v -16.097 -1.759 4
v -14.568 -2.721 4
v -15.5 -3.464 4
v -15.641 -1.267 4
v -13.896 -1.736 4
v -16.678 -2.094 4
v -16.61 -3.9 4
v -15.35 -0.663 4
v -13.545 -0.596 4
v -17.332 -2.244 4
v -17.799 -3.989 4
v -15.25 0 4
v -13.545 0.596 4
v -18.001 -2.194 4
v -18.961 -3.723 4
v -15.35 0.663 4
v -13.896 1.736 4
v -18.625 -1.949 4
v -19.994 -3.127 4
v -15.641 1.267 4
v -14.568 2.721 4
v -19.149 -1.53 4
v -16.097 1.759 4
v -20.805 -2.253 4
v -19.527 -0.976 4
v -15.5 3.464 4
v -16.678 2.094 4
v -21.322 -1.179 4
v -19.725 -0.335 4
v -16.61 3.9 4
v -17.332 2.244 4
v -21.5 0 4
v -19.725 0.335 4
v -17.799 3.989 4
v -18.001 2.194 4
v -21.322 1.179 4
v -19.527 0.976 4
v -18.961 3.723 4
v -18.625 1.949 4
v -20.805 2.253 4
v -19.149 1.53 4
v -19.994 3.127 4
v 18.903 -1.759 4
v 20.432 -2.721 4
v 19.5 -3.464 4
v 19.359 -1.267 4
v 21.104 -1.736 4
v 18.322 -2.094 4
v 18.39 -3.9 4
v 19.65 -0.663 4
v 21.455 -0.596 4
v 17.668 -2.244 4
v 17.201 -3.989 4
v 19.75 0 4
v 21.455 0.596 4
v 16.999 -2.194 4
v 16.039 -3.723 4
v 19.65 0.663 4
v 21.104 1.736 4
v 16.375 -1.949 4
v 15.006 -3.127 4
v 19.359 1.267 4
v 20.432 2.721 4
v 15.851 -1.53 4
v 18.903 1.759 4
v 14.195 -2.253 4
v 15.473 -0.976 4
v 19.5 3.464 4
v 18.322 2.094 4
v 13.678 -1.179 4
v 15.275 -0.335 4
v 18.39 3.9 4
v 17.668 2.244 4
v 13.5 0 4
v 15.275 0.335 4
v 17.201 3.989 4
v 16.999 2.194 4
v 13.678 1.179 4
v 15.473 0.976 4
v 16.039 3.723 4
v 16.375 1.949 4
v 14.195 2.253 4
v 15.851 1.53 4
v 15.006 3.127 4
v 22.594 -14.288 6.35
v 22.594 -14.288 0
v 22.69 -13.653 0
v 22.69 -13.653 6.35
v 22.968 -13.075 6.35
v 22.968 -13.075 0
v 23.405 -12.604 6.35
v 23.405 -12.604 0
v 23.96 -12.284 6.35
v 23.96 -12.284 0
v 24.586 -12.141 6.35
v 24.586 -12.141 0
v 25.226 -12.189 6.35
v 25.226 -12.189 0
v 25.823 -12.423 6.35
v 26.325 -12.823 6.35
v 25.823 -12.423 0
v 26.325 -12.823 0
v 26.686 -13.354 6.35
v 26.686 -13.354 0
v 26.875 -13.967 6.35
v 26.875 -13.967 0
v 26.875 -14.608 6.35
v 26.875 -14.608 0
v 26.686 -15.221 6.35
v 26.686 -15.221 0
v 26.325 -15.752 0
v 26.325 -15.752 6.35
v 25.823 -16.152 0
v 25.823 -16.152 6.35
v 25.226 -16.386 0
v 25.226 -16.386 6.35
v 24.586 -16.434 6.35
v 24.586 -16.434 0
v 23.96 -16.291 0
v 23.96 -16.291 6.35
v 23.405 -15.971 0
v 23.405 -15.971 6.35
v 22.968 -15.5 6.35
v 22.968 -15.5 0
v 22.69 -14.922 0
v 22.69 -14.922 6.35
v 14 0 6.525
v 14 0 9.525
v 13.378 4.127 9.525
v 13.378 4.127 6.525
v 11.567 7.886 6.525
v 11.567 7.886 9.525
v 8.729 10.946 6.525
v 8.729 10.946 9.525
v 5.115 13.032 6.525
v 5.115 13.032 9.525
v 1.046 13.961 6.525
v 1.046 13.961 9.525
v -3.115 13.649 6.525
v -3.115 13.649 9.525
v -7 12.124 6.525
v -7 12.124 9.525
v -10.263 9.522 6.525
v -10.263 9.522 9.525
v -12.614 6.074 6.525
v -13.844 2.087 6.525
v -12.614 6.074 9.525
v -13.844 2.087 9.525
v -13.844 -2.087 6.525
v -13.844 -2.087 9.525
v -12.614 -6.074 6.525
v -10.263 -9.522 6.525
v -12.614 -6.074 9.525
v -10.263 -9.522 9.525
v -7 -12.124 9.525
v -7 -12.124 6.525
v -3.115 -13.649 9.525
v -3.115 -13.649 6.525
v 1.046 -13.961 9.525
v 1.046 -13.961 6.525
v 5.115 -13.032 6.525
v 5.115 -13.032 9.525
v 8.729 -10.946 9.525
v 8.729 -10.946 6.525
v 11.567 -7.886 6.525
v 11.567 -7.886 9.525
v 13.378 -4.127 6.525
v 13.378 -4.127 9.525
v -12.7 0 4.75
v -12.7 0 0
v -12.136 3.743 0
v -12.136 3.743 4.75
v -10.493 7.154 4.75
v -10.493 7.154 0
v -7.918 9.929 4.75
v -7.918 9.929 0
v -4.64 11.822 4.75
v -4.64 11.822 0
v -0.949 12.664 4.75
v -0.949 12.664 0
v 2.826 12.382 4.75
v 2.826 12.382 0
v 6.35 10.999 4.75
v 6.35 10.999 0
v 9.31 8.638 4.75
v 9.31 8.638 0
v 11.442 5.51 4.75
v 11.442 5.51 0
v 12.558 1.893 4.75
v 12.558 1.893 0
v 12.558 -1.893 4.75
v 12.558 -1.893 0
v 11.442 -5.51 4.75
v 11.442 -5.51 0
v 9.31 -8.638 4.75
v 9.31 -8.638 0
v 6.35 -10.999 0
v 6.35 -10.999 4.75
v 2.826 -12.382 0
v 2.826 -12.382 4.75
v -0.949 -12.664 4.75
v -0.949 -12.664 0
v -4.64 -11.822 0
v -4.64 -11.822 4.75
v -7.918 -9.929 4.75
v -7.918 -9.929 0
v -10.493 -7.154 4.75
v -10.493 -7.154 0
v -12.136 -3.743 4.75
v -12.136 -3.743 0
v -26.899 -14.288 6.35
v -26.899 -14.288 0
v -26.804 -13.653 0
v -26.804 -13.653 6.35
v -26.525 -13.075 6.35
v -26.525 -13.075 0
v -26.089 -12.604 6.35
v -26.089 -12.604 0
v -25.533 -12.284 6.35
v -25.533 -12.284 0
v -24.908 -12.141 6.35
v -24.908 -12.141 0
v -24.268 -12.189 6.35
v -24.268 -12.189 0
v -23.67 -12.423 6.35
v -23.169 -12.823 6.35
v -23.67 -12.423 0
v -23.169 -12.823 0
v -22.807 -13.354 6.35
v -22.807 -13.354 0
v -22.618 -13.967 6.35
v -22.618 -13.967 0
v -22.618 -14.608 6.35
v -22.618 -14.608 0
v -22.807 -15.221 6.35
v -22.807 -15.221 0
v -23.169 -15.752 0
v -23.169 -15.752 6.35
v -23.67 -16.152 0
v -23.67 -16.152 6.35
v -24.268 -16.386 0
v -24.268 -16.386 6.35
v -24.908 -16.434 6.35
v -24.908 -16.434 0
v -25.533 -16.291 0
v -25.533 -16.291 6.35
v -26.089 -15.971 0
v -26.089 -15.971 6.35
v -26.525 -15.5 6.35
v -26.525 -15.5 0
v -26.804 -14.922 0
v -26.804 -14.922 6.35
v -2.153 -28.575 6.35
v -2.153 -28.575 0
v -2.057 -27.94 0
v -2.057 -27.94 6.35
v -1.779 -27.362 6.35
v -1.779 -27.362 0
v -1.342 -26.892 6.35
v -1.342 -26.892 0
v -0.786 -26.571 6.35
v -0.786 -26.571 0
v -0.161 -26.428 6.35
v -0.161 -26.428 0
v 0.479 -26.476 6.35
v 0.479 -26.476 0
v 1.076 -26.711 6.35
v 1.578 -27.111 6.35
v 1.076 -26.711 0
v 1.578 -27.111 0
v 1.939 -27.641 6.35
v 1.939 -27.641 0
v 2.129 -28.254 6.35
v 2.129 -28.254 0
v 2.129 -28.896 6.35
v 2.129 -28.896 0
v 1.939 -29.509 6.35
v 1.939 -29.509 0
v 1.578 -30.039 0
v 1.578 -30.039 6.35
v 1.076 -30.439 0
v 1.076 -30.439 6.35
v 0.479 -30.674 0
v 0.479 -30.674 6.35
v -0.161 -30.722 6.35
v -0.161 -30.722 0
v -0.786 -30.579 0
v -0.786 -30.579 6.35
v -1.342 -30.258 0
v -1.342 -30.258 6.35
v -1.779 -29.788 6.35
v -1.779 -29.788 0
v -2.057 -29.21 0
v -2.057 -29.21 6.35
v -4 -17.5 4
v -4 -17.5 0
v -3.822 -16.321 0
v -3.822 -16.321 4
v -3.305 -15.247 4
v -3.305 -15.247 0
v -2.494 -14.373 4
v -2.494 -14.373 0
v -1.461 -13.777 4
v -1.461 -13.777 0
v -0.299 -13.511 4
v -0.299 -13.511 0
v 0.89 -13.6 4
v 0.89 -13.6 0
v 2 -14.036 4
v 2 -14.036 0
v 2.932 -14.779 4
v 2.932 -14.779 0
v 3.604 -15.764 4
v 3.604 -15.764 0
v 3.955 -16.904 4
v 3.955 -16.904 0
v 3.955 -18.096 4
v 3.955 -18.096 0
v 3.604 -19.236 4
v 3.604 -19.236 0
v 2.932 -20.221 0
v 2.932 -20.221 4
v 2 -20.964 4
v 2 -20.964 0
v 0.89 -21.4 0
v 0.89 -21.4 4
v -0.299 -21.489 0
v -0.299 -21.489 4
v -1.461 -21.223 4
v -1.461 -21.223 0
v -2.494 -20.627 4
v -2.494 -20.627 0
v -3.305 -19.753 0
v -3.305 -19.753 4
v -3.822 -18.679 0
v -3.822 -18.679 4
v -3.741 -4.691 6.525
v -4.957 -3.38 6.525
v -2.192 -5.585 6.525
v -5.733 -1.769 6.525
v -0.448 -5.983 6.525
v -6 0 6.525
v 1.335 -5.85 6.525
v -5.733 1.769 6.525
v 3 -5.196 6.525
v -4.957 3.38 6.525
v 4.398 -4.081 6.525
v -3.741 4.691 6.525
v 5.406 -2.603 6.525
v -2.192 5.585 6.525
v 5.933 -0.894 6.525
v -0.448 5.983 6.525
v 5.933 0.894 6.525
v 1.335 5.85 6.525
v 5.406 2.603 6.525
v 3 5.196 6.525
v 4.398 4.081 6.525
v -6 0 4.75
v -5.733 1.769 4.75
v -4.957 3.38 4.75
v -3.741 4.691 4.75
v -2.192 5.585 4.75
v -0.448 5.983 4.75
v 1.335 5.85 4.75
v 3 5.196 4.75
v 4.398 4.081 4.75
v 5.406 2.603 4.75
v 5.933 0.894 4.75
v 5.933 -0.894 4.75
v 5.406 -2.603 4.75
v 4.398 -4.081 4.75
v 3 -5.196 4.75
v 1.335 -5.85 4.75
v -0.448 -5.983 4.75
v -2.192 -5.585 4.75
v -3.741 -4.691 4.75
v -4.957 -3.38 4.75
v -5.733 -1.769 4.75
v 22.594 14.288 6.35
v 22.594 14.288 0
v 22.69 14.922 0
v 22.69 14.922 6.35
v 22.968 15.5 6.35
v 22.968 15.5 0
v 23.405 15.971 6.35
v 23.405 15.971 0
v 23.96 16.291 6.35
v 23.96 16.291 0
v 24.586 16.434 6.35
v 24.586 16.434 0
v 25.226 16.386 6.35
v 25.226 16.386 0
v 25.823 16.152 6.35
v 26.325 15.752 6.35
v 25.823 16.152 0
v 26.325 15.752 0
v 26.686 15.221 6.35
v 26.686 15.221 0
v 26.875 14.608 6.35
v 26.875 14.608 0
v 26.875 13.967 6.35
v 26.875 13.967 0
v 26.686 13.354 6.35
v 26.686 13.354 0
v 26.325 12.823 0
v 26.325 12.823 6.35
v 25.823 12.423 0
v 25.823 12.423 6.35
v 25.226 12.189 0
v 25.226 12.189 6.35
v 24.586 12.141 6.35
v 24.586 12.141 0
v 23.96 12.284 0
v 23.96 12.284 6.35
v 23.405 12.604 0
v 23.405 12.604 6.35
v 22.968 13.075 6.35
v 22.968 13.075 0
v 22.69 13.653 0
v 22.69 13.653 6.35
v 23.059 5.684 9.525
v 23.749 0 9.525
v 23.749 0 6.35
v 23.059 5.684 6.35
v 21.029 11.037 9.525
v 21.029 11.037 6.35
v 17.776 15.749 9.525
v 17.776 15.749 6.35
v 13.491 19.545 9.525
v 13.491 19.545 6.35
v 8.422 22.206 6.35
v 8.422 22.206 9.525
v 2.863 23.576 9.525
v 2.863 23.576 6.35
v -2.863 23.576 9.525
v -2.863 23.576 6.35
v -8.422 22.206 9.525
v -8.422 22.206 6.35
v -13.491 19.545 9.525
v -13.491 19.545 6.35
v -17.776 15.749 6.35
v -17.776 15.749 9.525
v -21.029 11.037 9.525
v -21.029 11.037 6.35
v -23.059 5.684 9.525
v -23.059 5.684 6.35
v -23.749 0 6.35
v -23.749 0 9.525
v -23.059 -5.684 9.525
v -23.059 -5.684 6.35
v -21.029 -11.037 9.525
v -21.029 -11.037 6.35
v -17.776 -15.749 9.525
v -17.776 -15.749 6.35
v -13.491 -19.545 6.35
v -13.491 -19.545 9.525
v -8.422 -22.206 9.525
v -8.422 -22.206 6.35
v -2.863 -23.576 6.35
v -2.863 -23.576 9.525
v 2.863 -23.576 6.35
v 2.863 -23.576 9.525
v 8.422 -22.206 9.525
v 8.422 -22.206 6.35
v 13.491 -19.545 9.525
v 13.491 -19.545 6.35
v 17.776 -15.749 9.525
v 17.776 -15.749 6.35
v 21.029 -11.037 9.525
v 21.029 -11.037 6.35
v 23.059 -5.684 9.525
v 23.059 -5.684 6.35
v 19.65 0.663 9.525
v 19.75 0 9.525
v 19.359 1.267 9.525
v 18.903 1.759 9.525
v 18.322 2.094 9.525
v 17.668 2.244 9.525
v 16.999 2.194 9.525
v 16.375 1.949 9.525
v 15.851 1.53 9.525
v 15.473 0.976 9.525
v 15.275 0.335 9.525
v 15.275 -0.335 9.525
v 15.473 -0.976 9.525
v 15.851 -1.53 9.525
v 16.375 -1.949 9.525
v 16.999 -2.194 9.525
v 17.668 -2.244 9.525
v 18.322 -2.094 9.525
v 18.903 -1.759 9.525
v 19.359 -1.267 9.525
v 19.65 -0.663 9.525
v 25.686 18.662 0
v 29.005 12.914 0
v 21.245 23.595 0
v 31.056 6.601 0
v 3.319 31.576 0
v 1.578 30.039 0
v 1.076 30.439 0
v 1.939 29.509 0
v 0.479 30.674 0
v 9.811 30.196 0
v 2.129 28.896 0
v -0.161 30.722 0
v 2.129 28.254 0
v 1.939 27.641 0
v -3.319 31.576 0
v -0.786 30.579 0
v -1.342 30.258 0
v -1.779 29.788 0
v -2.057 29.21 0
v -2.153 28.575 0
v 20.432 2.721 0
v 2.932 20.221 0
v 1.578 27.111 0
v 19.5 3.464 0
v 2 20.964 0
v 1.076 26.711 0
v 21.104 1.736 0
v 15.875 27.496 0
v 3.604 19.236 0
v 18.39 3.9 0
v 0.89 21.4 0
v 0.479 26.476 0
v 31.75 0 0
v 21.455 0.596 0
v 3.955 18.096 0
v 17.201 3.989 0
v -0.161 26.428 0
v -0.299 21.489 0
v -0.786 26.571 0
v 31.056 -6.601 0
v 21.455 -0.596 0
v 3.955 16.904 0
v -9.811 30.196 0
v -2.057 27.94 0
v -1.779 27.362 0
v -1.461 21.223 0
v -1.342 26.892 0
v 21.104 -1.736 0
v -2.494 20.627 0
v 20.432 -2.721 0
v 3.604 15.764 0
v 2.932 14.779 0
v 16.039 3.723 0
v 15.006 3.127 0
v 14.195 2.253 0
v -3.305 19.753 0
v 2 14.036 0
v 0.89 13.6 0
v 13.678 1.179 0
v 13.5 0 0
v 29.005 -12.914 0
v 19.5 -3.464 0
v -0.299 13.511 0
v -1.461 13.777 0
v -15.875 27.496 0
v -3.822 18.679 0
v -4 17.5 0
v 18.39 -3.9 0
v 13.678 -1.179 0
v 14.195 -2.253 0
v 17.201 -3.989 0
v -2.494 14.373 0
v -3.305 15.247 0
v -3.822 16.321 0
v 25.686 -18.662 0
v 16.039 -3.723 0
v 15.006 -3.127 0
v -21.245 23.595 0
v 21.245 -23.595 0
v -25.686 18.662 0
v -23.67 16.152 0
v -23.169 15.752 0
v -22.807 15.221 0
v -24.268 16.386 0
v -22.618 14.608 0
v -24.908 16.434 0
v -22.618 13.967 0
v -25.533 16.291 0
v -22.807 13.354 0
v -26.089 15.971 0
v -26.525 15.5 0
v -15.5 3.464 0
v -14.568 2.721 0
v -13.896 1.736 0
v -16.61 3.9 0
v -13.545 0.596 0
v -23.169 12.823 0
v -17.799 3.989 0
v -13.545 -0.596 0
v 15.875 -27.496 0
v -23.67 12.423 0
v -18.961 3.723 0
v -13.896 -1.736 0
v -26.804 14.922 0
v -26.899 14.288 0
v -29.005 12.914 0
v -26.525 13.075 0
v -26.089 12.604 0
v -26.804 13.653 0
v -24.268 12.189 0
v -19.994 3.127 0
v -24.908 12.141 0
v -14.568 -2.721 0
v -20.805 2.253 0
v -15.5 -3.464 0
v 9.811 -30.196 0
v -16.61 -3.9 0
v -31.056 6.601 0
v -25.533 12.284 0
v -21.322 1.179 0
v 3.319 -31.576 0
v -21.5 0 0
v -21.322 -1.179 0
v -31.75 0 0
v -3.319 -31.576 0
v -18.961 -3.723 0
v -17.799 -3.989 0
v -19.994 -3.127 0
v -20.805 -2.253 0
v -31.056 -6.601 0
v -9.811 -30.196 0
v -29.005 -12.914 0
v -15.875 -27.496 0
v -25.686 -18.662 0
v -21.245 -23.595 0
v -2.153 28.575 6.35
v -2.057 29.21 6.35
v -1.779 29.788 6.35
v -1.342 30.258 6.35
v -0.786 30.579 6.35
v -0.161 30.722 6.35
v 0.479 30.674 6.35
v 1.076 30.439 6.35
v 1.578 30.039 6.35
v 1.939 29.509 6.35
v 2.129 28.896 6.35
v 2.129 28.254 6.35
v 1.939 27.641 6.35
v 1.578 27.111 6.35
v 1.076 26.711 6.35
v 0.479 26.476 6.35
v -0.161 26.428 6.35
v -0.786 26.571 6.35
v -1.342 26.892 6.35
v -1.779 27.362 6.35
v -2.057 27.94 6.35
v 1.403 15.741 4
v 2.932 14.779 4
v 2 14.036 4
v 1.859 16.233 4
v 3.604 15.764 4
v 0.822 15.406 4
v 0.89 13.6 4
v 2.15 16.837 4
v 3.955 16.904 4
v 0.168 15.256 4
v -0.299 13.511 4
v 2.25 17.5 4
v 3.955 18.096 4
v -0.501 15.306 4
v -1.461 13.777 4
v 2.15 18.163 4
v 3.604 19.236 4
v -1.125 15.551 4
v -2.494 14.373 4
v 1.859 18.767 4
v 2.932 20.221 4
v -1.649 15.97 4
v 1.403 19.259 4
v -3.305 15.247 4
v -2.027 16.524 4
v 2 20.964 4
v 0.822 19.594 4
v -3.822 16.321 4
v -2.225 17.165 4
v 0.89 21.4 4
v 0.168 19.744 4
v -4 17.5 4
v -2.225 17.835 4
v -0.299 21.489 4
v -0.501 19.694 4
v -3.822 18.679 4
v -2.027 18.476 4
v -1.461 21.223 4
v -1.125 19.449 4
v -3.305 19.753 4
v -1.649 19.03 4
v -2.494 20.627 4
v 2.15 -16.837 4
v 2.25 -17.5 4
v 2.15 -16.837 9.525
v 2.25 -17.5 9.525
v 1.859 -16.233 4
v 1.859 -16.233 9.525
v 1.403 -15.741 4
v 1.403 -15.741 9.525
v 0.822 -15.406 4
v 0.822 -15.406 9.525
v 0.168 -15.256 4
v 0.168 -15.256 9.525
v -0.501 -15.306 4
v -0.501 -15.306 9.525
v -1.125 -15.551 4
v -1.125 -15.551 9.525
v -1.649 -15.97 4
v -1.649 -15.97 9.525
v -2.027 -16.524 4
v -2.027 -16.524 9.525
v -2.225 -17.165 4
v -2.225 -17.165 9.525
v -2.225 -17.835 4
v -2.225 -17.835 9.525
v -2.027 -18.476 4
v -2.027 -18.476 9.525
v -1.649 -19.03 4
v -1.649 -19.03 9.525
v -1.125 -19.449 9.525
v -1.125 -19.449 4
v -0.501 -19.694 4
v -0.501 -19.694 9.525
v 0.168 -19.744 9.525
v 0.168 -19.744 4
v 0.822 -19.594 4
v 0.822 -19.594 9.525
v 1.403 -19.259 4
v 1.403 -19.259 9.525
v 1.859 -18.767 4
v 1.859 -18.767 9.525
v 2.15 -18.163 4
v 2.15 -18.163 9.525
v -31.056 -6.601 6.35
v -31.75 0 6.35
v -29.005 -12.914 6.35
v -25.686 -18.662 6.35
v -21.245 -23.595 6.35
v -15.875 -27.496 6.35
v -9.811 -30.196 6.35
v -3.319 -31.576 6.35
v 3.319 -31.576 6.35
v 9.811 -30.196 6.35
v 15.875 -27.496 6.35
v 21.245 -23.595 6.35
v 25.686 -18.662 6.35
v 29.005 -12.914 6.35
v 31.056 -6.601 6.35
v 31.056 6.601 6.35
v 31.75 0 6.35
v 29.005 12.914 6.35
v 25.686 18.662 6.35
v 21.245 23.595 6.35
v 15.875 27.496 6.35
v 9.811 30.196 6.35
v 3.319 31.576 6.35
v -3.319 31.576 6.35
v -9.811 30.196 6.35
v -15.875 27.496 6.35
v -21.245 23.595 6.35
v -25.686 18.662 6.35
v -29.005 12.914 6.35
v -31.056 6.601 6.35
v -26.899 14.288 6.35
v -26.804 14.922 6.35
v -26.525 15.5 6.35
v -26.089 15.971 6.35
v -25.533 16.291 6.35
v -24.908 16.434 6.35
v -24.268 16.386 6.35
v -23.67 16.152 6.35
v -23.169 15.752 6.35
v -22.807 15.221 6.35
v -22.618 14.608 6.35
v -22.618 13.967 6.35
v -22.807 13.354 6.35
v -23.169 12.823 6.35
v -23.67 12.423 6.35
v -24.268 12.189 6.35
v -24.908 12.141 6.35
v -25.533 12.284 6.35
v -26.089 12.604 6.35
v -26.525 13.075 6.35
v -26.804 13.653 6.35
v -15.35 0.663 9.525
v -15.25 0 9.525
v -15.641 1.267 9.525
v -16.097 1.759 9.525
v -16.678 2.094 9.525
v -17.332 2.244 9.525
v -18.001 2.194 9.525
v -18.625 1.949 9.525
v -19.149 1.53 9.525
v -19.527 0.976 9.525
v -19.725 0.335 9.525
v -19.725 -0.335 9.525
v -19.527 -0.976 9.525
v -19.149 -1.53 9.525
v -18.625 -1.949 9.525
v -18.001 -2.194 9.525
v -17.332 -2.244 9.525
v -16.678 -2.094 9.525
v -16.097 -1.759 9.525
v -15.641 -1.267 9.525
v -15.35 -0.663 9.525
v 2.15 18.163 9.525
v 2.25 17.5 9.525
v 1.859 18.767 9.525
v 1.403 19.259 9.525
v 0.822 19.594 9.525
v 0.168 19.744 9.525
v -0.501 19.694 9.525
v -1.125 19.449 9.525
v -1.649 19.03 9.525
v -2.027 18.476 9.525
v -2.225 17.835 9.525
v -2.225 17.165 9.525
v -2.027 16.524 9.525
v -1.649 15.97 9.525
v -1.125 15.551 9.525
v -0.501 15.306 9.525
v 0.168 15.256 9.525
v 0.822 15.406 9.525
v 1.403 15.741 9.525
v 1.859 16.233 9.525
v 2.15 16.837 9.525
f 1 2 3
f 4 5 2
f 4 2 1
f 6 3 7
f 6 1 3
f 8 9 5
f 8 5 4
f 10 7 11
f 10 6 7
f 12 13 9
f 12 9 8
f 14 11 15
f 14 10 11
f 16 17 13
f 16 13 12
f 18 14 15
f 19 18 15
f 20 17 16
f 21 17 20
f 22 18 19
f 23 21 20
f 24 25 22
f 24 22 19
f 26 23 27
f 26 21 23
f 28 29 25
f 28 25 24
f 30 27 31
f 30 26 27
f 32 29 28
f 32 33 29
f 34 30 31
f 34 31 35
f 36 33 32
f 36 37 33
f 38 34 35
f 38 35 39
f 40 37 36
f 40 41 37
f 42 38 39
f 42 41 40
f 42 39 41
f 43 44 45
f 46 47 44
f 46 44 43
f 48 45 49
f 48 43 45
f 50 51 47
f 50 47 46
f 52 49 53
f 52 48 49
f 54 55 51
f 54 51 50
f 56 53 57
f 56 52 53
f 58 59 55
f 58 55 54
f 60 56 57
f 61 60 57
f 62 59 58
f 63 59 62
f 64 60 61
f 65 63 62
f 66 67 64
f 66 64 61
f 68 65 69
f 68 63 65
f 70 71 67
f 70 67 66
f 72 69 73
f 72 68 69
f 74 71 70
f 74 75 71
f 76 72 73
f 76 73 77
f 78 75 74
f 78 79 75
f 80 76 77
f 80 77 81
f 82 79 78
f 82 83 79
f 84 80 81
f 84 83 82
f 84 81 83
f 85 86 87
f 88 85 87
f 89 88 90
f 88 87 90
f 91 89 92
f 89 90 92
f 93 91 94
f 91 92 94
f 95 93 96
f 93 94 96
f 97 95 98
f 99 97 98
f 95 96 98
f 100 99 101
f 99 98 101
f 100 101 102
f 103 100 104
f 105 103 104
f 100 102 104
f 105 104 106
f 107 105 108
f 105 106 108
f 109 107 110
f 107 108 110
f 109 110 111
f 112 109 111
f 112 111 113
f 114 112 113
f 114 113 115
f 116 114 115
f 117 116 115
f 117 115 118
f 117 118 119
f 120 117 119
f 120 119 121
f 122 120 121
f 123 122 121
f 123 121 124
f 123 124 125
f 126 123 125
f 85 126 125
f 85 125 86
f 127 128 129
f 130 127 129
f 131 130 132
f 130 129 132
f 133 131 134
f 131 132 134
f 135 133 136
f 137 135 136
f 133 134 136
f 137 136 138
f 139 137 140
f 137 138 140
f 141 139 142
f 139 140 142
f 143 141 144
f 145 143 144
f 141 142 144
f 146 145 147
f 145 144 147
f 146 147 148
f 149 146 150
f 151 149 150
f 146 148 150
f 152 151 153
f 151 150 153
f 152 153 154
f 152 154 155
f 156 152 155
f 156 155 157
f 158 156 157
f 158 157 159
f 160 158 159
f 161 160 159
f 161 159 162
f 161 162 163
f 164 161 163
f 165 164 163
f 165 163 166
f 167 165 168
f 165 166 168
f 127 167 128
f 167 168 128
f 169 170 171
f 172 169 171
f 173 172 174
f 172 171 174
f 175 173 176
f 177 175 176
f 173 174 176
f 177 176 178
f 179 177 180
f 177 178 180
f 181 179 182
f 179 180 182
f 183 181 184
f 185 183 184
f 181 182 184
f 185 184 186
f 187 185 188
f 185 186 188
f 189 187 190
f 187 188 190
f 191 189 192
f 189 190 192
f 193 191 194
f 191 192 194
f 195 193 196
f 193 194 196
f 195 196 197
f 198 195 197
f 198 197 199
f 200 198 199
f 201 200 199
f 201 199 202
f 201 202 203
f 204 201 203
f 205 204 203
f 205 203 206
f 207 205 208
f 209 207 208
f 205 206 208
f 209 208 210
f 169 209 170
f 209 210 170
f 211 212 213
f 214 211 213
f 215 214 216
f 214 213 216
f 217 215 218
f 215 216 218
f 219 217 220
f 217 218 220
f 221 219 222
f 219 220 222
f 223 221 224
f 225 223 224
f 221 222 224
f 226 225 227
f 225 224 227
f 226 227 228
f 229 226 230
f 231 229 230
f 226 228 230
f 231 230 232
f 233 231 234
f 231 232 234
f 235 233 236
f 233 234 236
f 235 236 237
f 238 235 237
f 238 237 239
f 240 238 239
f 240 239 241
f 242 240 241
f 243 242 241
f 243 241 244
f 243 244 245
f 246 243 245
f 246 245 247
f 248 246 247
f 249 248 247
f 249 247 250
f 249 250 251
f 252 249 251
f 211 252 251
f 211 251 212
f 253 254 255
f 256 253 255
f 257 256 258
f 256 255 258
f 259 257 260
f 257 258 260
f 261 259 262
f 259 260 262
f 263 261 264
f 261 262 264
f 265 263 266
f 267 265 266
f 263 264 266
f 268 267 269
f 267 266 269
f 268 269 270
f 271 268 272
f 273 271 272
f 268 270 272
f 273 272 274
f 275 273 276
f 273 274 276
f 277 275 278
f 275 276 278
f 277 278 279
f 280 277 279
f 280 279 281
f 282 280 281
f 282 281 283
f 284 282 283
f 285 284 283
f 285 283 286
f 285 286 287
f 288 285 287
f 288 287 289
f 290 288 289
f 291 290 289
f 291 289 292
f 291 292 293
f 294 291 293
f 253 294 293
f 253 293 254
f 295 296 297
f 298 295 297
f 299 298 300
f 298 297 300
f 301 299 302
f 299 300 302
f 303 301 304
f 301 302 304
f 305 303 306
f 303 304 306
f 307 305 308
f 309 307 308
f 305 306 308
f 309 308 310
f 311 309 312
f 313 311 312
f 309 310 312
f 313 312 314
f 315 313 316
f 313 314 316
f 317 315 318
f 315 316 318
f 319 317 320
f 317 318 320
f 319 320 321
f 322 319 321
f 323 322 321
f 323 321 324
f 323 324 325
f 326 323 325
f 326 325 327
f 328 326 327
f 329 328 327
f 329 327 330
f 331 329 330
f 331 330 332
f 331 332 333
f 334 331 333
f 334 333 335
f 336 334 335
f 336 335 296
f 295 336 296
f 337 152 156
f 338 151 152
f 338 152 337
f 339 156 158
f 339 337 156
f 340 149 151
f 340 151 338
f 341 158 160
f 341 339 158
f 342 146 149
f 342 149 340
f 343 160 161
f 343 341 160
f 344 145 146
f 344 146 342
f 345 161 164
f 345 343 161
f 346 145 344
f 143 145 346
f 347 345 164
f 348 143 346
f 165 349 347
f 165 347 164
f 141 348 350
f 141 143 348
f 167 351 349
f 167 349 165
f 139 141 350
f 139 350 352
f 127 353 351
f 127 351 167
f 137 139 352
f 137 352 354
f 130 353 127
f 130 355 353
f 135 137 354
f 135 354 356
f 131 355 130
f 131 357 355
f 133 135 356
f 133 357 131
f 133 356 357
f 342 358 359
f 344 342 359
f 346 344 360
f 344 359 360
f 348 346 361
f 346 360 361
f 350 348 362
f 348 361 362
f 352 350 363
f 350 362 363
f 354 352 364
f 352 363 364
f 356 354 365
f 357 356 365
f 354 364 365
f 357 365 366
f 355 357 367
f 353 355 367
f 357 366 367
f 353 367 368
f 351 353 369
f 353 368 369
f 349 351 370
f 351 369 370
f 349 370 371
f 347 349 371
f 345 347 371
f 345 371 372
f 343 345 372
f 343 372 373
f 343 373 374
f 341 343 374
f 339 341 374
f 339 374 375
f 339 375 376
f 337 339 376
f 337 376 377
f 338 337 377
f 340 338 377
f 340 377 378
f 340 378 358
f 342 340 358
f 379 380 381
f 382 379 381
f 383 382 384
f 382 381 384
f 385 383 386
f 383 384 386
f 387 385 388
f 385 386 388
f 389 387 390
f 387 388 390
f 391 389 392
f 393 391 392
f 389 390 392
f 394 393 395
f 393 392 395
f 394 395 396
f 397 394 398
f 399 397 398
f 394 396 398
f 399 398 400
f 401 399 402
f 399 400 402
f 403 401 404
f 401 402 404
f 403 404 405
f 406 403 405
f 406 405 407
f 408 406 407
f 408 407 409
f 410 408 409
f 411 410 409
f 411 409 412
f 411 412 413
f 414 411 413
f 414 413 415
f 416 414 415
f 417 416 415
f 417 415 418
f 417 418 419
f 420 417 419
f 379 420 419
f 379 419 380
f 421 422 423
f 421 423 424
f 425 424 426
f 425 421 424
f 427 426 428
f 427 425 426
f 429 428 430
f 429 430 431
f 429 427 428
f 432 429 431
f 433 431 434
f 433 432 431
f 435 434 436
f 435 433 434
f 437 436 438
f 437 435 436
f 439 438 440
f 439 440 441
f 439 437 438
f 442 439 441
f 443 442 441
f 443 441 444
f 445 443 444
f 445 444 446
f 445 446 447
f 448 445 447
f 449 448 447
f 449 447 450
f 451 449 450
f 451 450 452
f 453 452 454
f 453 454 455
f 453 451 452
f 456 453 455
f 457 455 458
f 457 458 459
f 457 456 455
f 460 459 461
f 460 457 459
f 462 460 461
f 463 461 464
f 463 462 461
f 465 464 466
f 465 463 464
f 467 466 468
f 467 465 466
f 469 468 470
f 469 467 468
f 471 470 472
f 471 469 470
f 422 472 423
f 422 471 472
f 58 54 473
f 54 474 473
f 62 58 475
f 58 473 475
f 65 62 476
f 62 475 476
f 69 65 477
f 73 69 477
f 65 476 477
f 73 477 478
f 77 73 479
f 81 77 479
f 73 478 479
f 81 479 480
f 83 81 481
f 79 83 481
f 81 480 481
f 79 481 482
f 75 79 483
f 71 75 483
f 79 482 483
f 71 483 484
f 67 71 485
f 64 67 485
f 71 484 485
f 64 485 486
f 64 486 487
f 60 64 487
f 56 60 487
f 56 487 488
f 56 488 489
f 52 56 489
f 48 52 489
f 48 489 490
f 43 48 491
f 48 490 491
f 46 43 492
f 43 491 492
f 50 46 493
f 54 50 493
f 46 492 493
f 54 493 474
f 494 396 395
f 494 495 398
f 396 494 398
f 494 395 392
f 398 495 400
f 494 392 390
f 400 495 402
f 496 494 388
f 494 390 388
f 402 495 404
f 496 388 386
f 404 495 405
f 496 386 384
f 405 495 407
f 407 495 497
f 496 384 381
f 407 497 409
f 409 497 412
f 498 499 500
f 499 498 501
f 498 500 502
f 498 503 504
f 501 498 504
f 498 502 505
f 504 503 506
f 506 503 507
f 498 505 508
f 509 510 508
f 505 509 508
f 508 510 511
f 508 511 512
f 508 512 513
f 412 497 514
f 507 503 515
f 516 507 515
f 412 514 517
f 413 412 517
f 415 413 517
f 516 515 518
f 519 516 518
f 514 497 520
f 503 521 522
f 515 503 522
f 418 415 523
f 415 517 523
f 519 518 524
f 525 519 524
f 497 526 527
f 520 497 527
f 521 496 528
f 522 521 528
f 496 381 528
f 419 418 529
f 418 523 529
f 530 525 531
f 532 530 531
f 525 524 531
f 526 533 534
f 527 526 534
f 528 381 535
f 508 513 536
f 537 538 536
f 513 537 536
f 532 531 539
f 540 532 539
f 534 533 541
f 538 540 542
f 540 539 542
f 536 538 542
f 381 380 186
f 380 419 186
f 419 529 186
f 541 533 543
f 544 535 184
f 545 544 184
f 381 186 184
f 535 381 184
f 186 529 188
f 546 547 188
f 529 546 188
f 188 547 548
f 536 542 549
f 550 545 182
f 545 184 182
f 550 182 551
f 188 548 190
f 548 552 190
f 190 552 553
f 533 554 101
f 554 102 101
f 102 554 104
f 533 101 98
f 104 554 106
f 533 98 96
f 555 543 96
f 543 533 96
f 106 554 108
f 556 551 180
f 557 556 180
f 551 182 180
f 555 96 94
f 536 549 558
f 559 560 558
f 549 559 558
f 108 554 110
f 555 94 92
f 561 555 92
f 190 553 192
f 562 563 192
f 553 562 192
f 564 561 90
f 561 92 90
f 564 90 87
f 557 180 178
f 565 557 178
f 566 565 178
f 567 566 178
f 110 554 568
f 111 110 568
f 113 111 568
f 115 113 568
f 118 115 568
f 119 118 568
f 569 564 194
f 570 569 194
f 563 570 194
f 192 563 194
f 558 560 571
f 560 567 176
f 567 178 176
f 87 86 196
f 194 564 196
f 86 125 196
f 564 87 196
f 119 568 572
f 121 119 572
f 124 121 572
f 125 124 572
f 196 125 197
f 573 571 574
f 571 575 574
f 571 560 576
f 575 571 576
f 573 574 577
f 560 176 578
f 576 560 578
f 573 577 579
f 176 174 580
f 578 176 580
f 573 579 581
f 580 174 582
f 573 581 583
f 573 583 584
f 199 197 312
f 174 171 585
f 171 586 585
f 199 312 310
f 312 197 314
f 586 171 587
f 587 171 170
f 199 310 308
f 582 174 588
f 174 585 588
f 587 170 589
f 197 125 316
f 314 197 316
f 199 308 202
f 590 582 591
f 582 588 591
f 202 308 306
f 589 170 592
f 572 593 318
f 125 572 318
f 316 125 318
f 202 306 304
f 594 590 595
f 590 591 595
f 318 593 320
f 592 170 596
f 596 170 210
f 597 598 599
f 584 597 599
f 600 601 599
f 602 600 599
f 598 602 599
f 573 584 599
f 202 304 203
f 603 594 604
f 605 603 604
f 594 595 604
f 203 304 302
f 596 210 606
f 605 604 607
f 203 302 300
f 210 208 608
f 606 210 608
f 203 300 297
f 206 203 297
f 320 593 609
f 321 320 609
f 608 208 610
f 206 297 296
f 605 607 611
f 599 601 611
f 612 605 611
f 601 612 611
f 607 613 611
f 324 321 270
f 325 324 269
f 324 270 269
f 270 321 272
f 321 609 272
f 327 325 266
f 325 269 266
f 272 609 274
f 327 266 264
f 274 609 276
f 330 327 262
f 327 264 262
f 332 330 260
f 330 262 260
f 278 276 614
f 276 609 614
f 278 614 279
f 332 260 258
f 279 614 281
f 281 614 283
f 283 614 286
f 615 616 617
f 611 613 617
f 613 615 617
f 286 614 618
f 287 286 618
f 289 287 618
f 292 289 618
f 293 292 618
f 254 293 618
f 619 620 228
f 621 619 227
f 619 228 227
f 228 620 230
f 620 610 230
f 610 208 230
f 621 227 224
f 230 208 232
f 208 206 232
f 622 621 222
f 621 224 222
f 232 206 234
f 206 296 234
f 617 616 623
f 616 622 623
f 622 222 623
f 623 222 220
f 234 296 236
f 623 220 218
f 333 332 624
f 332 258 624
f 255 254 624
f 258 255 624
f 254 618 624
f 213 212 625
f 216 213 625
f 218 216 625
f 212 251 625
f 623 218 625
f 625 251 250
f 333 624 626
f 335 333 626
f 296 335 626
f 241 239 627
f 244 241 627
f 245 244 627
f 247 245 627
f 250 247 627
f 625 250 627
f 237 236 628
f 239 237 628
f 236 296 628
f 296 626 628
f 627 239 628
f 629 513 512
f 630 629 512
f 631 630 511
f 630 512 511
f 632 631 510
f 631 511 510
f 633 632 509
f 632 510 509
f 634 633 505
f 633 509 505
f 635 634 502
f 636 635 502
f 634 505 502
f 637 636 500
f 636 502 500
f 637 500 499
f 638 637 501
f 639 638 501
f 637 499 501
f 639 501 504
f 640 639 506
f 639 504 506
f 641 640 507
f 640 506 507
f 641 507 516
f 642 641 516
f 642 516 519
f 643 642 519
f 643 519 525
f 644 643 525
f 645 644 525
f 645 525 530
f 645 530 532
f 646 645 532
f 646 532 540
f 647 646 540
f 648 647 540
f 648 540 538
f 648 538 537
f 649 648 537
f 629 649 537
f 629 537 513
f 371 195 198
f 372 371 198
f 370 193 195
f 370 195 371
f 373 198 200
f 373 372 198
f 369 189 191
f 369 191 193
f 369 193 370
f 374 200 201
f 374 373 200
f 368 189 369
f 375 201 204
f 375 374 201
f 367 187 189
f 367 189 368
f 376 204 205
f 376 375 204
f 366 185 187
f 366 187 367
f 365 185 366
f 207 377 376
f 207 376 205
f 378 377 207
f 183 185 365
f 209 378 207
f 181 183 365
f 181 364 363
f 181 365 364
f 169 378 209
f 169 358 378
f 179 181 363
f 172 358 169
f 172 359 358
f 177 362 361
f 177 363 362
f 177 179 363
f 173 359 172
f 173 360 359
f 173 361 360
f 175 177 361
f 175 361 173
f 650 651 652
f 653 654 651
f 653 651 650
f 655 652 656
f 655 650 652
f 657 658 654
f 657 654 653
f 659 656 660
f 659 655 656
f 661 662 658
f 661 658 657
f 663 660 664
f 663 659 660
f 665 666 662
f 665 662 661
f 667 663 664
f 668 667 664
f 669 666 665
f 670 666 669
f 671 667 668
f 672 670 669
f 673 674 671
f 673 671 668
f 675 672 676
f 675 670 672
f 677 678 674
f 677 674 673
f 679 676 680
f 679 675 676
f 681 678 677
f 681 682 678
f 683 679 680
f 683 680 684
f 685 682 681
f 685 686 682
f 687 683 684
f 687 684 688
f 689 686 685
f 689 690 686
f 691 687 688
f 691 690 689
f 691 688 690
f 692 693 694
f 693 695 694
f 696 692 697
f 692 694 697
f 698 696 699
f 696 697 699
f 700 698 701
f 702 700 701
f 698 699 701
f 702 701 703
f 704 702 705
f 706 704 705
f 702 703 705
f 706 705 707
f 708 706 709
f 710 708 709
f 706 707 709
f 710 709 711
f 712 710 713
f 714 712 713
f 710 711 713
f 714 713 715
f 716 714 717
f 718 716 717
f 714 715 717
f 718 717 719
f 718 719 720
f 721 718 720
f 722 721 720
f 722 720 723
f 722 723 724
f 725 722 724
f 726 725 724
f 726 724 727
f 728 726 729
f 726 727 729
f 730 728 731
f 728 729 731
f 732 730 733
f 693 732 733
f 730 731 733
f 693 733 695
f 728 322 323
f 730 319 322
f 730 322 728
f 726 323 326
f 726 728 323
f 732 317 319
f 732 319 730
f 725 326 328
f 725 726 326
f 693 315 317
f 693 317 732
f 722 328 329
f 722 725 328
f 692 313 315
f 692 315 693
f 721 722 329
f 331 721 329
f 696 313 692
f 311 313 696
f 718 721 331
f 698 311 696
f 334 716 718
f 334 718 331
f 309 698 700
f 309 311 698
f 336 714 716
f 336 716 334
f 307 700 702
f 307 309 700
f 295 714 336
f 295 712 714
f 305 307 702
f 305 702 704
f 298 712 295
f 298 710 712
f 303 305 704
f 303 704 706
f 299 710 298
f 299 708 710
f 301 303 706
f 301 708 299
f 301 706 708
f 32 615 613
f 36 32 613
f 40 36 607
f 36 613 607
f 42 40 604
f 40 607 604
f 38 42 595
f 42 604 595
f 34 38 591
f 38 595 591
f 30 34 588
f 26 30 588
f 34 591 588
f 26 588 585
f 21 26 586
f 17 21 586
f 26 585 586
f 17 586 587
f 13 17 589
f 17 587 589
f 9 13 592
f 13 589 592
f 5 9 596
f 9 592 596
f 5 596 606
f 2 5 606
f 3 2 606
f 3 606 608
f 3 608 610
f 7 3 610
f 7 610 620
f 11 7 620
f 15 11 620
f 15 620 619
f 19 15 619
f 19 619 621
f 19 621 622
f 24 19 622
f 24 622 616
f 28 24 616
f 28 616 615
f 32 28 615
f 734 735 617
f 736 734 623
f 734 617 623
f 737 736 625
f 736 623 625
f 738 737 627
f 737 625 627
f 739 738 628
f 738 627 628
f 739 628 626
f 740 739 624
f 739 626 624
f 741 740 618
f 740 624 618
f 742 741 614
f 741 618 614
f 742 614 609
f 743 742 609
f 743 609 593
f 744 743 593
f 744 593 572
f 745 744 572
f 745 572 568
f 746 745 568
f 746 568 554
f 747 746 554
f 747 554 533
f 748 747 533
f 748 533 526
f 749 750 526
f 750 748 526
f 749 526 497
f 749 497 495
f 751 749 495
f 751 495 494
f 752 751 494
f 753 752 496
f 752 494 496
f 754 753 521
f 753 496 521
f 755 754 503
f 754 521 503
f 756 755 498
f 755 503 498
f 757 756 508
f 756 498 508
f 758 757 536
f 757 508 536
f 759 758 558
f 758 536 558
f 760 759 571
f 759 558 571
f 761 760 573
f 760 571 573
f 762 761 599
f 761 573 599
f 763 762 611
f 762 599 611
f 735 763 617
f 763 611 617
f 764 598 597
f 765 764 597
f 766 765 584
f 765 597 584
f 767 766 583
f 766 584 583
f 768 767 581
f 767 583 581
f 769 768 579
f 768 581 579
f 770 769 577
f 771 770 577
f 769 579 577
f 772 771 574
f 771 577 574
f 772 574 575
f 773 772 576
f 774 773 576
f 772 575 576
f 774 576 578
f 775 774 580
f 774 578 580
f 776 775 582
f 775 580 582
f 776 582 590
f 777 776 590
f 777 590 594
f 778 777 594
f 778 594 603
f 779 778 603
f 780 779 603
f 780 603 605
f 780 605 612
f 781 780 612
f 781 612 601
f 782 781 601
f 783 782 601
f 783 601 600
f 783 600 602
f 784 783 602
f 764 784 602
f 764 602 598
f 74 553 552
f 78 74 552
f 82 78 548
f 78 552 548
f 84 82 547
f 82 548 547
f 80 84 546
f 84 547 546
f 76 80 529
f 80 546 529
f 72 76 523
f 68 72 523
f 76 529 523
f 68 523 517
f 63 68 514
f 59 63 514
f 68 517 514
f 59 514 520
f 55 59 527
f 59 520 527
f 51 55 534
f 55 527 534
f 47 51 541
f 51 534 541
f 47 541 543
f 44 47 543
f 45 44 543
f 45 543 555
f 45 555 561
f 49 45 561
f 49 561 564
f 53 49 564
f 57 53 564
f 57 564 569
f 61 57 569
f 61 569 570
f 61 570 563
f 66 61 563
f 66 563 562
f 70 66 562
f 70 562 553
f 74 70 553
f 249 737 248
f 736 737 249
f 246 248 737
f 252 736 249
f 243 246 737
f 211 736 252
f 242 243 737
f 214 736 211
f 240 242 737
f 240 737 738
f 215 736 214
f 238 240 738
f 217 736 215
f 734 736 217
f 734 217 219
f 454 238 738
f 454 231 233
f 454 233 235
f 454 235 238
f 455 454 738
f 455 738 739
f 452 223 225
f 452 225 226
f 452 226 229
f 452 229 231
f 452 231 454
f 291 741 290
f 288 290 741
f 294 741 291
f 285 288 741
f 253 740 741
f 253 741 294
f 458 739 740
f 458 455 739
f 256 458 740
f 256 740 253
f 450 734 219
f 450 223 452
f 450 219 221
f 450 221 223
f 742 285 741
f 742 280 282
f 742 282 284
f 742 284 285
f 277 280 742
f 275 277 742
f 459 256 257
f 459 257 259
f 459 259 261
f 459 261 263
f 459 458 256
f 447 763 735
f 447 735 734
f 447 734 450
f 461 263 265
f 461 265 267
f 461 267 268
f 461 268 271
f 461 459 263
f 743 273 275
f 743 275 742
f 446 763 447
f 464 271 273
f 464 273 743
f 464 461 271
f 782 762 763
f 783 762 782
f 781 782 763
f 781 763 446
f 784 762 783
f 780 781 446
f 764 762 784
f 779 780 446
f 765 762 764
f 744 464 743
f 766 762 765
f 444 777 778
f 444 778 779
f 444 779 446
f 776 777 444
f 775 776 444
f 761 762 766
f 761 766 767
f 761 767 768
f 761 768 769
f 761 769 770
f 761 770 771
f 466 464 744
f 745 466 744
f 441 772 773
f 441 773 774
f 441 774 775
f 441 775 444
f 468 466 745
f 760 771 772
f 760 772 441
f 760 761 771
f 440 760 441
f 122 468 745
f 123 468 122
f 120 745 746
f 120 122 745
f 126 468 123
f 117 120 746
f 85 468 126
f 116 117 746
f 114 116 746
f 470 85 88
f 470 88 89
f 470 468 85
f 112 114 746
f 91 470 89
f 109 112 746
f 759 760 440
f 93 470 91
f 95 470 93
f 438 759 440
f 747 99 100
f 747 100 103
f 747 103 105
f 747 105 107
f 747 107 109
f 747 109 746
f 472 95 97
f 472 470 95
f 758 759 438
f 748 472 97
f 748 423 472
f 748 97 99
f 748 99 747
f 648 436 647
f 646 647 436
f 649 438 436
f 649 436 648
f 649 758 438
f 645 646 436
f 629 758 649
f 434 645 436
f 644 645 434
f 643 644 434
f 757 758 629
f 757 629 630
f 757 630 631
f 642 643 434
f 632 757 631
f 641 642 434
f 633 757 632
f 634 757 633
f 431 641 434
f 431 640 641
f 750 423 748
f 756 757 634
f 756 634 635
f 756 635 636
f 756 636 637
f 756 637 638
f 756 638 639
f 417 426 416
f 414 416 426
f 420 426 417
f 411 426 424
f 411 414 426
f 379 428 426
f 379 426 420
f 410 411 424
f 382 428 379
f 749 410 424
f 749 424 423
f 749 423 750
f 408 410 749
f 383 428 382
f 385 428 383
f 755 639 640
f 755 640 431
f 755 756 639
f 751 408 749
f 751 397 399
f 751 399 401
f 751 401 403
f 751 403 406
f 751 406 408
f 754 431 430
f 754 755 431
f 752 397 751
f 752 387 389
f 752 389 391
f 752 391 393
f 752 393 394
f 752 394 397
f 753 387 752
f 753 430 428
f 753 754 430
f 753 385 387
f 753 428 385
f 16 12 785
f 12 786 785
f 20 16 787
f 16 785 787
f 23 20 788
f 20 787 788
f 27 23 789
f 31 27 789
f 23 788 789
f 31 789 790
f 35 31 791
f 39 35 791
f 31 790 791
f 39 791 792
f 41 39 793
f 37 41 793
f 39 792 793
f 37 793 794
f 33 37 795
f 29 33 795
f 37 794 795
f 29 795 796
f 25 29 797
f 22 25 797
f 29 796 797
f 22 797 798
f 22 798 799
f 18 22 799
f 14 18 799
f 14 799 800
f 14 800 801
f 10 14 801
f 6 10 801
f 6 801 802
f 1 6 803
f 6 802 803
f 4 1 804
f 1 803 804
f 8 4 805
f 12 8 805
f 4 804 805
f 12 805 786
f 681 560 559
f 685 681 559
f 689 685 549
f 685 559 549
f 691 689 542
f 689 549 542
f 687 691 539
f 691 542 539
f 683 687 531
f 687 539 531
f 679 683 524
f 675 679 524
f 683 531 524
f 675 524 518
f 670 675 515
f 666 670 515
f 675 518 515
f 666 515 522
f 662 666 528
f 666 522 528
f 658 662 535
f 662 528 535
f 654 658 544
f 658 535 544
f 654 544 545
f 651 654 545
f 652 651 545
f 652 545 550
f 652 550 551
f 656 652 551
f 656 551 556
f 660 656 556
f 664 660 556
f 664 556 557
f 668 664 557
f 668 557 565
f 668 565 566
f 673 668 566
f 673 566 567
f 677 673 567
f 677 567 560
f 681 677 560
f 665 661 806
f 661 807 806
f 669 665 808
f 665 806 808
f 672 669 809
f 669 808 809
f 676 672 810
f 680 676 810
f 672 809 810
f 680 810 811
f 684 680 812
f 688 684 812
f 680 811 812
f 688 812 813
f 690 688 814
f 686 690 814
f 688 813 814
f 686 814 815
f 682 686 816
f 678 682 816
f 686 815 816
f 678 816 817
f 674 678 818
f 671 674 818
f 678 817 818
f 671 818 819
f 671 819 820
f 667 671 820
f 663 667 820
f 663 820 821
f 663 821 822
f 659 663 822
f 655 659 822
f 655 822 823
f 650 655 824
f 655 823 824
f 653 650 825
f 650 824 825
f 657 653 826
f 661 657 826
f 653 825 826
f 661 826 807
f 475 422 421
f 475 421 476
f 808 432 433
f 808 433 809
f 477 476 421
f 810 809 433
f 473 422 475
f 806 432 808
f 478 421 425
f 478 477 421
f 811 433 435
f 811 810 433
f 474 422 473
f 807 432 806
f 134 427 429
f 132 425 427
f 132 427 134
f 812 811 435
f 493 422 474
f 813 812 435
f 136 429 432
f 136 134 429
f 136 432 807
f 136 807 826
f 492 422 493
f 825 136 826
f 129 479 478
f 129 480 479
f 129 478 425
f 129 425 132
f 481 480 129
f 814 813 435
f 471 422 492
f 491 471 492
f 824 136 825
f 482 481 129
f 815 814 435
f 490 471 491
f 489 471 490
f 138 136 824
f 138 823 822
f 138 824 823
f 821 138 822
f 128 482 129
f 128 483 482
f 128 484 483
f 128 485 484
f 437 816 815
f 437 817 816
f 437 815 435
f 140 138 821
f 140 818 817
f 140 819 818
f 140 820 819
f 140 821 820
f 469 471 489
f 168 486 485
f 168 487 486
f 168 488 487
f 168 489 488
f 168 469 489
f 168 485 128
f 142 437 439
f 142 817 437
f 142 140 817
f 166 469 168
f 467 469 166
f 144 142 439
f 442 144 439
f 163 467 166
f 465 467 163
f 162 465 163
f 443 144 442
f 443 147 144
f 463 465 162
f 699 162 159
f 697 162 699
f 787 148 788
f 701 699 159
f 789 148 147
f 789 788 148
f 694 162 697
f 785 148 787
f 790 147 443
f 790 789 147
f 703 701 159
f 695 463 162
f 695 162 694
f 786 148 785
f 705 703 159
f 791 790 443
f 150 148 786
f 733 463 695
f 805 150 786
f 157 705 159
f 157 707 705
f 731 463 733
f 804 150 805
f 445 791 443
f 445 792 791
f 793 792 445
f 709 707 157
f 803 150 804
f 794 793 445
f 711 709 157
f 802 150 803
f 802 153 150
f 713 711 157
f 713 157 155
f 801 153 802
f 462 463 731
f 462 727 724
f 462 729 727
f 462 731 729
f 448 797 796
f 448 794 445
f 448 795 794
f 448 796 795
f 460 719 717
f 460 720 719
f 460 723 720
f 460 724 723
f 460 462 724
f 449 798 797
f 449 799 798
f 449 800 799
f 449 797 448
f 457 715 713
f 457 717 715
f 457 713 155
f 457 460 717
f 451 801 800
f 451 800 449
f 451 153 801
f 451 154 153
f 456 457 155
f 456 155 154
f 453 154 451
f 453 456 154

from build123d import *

# Parameters (mm, degrees)
SKETCH1_R                      = 31.75
BOSS_EXTRUDE1_DEPTH            = 9.525
SKETCH2_R                      = 14
CUT_EXTRUDE1_DEPTH             = 3
F_8_CLEARANCE_HOLE1_D          = 4.3053
SKETCH5_R                      = 12.7
CUT_EXTRUDE2_DEPTH             = 4.7498
SKETCH6_R                      = 6
CUT_EXTRUDE3_DEPTH             = 46.154485215
CBORE_FOR_M4_SHCS1_D           = 4.5
CBORE_FOR_M4_SHCS1_CBORE_D     = 8
CBORE_FOR_M4_SHCS1_CBORE_DEPTH = 4
SKETCH9_OUTSIDE_W              = 83.562
SKETCH9_OUTSIDE_H              = 83.562
SKETCH9_OUTSIDE_R              = 23.749
CUT_EXTRUDE4_DEPTH             = 3.175


with BuildPart() as part:
    # Sketch1 → Boss-Extrude1 (new body)
    with BuildSketch(Plane.XY):
        with Locations(Location((0, 0, 0), (0, 0, 180))):
            Circle(SKETCH1_R)
    extrude(amount=BOSS_EXTRUDE1_DEPTH)

    # Sketch2 → Cut-Extrude1 (cut)
    with BuildSketch(Plane.XY.offset(9.525)):
        Circle(SKETCH2_R)
    extrude(amount=-CUT_EXTRUDE1_DEPTH, mode=Mode.SUBTRACT)

    # #8 Clearance Hole1 (through all)
    with Locations(Plane.XY.offset(9.525)):
        with Locations((0, 28.575), (24.746675913, 14.2875), (24.746675913, -14.2875), (0, -28.575), (-24.746675913, -14.2875), (-24.746675913, 14.2875)):
            Hole(F_8_CLEARANCE_HOLE1_D / 2)

    # Sketch5 → Cut-Extrude2 (cut)
    with BuildSketch(Plane(origin=(0, 0, 0), x_dir=(-1, 0, 0), z_dir=(0, 0, -1))):
        Circle(SKETCH5_R)
    extrude(amount=-CUT_EXTRUDE2_DEPTH, mode=Mode.SUBTRACT)

    # Sketch6 → Cut-Extrude3 (cut, through all)
    with BuildSketch(Plane(origin=(0, 0, 4.7498), x_dir=(-1, 0, 0), z_dir=(0, 0, -1))):
        Circle(SKETCH6_R)
    extrude(amount=-CUT_EXTRUDE3_DEPTH, mode=Mode.SUBTRACT)

    # CBORE for M4 SHCS1 (through all)
    with Locations(Plane(origin=(0, 0, 0), x_dir=(-1, 0, 0), z_dir=(0, 0, -1))):
        with Locations((0, 17.5), (17.5, 0), (0, -17.5), (-17.5, 0)):
            CounterBoreHole(CBORE_FOR_M4_SHCS1_D / 2, CBORE_FOR_M4_SHCS1_CBORE_D / 2, CBORE_FOR_M4_SHCS1_CBORE_DEPTH)

    # Sketch9 outside → Cut-Extrude4 (cut)
    with BuildSketch(Plane.XY.offset(9.525)):
        Rectangle(SKETCH9_OUTSIDE_W, SKETCH9_OUTSIDE_H)
        Circle(SKETCH9_OUTSIDE_R, mode=Mode.SUBTRACT)
    extrude(amount=-CUT_EXTRUDE4_DEPTH, mode=Mode.SUBTRACT)


solid = part.part
